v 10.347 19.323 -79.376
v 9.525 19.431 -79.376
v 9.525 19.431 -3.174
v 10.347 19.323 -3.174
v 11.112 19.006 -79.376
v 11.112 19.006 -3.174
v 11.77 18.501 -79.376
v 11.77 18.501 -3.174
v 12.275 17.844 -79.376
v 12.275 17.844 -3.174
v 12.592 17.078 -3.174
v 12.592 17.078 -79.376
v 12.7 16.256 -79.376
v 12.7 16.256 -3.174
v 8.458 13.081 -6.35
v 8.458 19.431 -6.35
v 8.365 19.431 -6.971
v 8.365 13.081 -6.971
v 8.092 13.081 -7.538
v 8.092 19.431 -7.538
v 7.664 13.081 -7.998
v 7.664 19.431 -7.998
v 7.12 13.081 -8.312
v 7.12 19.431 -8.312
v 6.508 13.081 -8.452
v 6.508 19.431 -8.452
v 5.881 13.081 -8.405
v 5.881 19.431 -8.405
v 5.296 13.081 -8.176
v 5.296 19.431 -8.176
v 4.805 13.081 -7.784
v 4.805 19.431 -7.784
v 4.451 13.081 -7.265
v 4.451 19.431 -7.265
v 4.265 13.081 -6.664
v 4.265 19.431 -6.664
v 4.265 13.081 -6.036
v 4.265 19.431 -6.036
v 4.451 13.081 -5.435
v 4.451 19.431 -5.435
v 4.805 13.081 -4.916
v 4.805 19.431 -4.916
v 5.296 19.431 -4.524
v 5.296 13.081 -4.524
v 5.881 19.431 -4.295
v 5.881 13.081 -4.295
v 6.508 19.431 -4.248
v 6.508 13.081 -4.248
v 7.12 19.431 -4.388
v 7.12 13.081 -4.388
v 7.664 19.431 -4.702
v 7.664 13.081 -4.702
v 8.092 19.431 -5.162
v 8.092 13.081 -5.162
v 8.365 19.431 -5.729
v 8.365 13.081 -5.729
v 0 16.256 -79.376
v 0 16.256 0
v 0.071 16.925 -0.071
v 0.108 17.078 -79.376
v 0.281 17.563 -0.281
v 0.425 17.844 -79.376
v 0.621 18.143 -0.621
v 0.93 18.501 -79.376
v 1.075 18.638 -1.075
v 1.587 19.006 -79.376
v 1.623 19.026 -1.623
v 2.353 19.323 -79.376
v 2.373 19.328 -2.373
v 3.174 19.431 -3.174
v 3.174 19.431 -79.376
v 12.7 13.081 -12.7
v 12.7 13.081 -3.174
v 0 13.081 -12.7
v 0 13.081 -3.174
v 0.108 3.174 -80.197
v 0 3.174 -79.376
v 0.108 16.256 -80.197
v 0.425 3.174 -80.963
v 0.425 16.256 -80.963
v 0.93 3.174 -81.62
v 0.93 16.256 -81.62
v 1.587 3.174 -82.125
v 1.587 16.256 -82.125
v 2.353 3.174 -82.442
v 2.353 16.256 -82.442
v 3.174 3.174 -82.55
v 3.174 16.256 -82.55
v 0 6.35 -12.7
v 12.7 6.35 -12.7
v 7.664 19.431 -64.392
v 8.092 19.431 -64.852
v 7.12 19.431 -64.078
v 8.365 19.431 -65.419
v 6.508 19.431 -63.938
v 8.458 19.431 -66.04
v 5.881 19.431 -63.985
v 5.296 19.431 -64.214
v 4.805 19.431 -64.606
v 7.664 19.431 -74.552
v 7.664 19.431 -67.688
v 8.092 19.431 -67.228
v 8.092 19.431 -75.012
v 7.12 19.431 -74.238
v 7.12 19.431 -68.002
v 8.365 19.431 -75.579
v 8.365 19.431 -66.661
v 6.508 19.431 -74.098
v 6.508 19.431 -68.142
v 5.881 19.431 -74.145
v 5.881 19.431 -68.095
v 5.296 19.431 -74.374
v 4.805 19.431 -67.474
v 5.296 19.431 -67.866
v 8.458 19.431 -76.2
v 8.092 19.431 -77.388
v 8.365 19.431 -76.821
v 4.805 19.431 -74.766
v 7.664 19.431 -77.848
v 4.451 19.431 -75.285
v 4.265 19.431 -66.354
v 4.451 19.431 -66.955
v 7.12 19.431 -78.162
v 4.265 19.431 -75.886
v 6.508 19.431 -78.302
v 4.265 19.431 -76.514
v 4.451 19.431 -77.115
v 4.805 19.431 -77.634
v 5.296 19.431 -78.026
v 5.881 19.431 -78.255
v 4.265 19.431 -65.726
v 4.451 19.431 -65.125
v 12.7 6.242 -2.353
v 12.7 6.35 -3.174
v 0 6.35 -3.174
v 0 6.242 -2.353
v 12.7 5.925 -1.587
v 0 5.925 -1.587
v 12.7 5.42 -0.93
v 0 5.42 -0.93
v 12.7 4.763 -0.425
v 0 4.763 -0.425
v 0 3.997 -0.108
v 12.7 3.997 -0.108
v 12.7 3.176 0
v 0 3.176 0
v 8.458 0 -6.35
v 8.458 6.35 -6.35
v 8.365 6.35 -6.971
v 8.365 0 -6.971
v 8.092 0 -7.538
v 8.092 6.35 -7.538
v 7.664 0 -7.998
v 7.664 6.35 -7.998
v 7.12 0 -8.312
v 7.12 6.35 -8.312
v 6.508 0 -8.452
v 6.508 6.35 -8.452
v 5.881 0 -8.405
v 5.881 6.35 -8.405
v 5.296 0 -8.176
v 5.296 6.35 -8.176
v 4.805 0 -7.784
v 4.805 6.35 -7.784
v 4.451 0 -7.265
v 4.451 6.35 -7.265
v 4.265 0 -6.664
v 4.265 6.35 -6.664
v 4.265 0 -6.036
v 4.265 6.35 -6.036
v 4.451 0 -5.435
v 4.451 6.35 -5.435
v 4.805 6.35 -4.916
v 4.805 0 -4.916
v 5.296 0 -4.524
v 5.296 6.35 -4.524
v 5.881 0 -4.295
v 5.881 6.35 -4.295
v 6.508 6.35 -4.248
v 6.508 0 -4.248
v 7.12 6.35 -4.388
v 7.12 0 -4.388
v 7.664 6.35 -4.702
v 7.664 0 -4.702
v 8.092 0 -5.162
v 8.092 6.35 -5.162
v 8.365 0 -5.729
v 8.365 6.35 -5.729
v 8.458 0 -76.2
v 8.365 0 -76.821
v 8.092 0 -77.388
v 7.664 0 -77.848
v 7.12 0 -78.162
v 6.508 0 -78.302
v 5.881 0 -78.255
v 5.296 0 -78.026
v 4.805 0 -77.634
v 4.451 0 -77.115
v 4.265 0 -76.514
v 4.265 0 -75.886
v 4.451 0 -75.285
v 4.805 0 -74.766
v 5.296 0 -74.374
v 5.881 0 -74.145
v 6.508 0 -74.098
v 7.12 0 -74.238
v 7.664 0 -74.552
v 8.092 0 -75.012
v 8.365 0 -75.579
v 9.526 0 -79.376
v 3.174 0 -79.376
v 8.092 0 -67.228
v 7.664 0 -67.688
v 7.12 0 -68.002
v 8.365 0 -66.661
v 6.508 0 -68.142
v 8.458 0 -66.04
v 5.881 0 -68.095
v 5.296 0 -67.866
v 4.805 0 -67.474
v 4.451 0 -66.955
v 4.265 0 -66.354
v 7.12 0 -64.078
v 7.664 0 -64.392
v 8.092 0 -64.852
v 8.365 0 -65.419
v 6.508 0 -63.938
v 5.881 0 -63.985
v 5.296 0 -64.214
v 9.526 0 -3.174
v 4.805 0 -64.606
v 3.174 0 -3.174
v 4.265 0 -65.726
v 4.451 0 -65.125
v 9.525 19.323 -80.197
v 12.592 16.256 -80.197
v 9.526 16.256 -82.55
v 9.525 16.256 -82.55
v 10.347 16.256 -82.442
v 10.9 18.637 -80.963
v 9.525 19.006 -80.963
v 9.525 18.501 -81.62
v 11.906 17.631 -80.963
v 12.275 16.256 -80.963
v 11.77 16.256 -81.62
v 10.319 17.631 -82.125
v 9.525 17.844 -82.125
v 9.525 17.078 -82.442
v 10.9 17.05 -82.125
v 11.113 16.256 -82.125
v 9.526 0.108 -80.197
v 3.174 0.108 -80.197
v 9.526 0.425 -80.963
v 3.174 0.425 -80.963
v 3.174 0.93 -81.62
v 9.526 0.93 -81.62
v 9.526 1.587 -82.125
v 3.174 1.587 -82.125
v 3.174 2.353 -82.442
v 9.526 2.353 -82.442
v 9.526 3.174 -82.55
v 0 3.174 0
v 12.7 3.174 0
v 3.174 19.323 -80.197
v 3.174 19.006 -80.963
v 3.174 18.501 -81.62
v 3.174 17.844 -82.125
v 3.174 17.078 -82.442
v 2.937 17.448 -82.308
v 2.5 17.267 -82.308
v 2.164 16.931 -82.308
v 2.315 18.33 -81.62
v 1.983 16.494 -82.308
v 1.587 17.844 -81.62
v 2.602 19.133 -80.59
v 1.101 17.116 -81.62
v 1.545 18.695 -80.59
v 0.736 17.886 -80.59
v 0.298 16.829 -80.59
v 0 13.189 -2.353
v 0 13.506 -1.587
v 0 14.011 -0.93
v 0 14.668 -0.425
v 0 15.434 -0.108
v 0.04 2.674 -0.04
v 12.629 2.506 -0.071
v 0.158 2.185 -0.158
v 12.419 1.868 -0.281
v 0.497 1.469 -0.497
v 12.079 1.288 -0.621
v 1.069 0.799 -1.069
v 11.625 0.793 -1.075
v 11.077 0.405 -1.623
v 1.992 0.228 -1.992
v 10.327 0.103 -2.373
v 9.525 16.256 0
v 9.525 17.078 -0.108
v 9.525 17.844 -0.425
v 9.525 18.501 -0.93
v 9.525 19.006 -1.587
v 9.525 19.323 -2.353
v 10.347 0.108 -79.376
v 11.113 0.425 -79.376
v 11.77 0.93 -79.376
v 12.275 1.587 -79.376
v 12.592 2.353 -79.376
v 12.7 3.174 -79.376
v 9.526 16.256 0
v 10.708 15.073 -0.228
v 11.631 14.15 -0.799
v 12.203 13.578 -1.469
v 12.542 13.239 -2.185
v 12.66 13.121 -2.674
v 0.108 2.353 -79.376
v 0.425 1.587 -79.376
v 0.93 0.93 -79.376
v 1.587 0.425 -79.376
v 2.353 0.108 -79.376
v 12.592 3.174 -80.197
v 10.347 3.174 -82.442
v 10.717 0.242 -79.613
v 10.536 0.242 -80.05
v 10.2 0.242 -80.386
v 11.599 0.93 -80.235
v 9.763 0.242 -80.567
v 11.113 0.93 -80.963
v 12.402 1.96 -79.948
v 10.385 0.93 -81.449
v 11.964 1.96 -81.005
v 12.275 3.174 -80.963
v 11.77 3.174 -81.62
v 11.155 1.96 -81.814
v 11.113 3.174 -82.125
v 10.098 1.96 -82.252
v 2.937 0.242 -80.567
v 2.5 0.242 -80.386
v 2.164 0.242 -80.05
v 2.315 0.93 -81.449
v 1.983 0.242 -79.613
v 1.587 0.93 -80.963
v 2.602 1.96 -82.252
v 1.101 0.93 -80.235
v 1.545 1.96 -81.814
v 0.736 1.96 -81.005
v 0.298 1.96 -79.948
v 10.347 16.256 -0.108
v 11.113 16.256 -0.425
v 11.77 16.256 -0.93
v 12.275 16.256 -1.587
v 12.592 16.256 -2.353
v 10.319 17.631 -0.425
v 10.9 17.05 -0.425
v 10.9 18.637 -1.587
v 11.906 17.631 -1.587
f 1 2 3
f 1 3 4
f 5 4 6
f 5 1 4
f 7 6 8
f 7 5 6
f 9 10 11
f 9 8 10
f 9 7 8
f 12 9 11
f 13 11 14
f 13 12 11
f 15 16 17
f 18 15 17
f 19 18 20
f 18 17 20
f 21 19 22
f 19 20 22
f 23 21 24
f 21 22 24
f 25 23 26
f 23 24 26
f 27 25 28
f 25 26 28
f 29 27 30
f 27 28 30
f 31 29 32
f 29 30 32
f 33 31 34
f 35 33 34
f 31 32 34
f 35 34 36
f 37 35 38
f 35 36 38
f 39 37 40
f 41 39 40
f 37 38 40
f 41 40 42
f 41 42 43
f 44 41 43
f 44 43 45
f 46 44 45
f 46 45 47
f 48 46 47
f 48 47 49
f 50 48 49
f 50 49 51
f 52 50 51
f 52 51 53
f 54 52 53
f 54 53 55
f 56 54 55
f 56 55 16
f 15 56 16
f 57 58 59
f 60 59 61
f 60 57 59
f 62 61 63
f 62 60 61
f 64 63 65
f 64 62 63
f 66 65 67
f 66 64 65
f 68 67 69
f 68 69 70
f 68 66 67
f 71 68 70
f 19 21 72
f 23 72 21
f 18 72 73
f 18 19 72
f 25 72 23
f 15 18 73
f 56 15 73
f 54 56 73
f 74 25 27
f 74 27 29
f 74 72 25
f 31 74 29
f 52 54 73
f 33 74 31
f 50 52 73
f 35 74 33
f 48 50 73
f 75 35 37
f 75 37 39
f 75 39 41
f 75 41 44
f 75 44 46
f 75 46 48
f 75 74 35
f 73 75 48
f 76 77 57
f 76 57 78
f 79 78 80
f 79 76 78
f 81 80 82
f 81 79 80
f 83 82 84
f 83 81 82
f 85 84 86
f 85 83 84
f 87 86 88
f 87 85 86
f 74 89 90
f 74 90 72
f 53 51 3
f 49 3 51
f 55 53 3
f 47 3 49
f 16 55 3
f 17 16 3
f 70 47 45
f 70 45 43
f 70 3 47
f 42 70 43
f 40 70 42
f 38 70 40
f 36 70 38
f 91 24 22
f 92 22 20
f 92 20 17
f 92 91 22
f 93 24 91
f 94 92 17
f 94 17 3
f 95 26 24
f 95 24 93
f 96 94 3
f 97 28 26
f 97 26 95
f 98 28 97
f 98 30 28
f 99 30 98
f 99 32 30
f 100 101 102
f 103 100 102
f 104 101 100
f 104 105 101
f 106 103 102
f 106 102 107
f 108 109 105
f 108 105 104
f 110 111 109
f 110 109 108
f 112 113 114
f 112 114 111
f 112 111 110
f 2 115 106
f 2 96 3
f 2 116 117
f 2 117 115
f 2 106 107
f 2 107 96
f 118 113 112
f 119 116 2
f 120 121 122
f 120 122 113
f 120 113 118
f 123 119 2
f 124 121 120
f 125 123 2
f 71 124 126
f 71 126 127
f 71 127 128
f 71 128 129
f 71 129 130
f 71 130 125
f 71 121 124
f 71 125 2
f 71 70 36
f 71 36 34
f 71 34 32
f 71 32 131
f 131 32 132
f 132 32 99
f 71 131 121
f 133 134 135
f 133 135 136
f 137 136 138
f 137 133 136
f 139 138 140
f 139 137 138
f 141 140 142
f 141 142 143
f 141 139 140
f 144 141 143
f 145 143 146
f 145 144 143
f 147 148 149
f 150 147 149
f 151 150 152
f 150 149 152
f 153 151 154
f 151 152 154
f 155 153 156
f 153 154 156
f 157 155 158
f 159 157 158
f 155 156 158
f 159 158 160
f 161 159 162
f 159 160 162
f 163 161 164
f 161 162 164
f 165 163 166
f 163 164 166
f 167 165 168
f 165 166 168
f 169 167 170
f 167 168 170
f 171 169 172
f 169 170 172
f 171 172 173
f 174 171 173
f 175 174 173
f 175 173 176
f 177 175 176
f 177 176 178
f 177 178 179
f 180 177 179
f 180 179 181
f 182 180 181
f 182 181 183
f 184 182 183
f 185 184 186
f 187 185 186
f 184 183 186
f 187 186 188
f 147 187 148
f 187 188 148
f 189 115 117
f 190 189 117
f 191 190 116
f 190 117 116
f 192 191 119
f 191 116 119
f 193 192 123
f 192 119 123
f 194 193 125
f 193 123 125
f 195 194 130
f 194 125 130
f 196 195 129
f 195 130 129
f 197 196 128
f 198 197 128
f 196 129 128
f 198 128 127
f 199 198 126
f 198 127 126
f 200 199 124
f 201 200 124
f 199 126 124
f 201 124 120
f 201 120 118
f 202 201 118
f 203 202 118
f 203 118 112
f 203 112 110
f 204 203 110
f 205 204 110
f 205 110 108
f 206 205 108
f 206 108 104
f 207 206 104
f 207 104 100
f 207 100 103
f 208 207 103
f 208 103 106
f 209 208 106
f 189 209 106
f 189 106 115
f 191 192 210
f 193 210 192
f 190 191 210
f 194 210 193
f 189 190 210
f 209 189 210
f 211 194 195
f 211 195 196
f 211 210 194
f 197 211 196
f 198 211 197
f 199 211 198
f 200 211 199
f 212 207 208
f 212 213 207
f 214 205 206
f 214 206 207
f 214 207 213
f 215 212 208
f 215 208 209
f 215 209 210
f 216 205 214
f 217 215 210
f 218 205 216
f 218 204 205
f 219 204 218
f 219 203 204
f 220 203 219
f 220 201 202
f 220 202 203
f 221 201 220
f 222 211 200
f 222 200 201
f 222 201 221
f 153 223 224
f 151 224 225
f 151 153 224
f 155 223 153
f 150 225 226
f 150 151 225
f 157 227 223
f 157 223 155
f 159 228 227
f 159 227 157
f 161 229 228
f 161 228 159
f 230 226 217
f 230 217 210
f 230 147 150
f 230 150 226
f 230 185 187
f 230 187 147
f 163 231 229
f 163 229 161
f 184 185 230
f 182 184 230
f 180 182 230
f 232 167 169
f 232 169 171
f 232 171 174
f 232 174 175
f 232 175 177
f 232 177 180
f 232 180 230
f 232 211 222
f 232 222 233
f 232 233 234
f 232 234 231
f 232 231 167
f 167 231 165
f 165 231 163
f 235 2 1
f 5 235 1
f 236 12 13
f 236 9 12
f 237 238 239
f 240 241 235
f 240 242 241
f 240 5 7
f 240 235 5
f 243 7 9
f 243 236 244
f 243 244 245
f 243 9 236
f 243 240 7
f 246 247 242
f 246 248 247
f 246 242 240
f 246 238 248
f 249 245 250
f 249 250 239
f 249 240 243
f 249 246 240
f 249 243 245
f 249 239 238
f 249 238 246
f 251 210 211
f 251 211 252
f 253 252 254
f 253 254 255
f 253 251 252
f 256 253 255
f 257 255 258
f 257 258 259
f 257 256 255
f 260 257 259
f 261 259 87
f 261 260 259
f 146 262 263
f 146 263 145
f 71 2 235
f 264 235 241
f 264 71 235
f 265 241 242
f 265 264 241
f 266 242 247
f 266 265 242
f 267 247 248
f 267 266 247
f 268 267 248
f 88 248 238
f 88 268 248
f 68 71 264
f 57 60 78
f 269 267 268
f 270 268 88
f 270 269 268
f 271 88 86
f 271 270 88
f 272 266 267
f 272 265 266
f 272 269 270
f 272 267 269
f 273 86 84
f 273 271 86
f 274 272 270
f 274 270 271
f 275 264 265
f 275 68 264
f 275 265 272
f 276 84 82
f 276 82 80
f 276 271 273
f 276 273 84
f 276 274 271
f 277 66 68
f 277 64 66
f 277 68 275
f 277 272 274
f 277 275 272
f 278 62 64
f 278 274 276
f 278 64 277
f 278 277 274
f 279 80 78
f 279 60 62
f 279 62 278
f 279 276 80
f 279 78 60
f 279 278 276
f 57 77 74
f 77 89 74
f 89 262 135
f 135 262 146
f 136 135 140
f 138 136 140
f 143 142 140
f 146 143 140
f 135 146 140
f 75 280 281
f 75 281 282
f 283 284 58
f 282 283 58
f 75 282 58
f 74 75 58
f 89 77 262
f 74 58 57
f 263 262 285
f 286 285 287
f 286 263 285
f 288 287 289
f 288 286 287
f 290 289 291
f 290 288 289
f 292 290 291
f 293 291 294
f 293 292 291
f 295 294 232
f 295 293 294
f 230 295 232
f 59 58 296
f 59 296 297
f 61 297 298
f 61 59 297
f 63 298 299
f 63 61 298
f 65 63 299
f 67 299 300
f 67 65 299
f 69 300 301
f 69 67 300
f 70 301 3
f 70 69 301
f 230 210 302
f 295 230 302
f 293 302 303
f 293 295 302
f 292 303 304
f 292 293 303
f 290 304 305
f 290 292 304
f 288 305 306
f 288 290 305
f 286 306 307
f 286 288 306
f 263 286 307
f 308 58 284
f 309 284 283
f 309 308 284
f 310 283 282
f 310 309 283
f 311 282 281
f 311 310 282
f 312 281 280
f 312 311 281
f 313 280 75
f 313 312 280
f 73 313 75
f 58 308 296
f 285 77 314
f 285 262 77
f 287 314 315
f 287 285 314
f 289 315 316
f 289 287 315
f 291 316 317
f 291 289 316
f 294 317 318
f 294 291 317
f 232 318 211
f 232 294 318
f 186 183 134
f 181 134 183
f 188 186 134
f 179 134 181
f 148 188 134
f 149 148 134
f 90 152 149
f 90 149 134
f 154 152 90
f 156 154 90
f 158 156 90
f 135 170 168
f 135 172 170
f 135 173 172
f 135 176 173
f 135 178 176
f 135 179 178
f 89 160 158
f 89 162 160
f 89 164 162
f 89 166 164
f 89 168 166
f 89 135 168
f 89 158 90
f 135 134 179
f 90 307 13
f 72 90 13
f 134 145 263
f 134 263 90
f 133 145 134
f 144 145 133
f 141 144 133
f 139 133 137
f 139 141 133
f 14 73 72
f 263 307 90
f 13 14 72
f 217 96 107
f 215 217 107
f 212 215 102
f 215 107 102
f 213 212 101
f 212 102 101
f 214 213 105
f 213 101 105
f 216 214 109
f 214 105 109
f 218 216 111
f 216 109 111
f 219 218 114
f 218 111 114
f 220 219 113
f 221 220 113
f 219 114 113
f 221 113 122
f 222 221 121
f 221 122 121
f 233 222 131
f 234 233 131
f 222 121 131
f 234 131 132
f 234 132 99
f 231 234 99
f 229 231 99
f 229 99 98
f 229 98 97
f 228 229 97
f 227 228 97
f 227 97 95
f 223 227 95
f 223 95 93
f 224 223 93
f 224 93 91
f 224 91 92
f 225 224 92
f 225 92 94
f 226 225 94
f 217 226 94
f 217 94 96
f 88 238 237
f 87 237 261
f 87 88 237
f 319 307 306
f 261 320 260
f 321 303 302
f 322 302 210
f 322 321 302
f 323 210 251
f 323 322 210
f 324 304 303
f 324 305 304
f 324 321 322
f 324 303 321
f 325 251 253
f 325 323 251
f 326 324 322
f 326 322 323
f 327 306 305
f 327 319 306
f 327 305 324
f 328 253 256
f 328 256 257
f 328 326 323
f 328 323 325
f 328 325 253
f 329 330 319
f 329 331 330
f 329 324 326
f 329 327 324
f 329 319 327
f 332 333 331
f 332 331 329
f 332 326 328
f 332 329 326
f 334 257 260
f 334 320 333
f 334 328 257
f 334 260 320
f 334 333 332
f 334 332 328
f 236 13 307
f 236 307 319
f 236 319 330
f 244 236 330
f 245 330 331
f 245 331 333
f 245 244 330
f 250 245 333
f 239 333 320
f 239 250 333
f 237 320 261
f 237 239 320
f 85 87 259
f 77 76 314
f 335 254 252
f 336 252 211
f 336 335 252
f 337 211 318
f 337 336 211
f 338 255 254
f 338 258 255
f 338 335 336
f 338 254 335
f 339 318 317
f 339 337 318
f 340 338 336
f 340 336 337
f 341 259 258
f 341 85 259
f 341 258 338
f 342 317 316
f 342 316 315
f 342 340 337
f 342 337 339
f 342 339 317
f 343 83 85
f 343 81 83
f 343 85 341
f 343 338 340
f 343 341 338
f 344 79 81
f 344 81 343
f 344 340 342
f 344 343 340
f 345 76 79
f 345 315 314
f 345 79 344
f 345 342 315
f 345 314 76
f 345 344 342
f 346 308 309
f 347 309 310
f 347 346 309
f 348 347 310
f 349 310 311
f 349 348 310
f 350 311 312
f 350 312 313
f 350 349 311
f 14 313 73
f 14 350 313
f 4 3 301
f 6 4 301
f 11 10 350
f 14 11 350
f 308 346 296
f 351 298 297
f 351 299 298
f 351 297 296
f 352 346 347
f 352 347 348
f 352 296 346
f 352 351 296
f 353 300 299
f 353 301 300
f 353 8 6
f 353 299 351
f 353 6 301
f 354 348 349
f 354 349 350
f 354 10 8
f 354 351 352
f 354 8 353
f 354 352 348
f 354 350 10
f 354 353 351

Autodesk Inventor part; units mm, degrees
ref_plane "YZ Plane" through (0, 0, 0) normal (1, 0, 0) x (0, 1, 0)
ref_plane "XZ Plane" through (0, 0, 0) normal (0, 1, 0) x (-1, 0, 0)
ref_plane "XY Plane" through (0, 0, 0) normal (0, 0, 1) x (1, 0, 0)
sketch "Sketch1" plane through (0, 0, 0) normal (1, 0, 0) x (0, 1, 0)
  line L0 (0, 0) -> (6.35, 0)
  line L1 (6.35, 0) -> (6.35, -12.7)
  line L2 (6.35, -12.7) -> (13.081, -12.7)
  line L3 (13.081, -12.7) -> (13.081, 0)
  line L4 (13.081, 0) -> (19.431, 0)
  line L5 (19.431, 0) -> (19.431, -82.55)
  line L6 (19.431, -82.55) -> (0, -82.55)
  line L7 (0, -82.55) -> (0, 0)
  dimension "d0" = 6.35
  dimension "d1" = 12.7
  dimension "d2" = 6.731
  dimension "d11" = 6.35
  dimension "d12" = 82.55
  dimension "d18" = 12.7
extrude "Extrusion1" add sketch "Sketch1" along normal blind 12.7
sketch "Sketch3" plane through (0, 19.431, 0) normal (0, 1, 0) x (1, 0, 0)
  line L0 (0, 12.7) -> (12.7, 12.7) projected
  line L1 (12.7, 12.7) -> (0, 12.7)
  line L2 (0, 12.7) -> (0, 0)
  line L3 (0, 0) -> (12.7, 0)
  line L4 (12.7, 0) -> (12.7, 12.7)
  line L5 (0, 0) -> (12.7, 12.7)
  circle A0 centre (6.35, 6.35) radius 2.1082
  line L6 (0, 82.55) -> (12.7, 82.55) projected
  line L7 (6.35, 82.55) -> (6.35, 76.2)
  circle A1 centre (6.35, 76.2) radius 2.1082
  dimension "d13" = 4.2164
  dimension "d16" = 6.35
  dimension "d17" = 4.2164
extrude "Extrusion3" cut sketch "Sketch3" against normal blind 28.575 contours A0 L5 | L5 A0 | A1
fillet "Fillet1" radius 3.175 1 edges at (12.7, 19.431, -41.275)
fillet "Fillet2" radius 3.175 14 edges at (11.7701, 18.5011, 0) (12.7, 14.6685, 0) (4.7625, 19.431, 0) (0, 19.431, -41.275) (11.7701, 18.5011, -82.55) (12.7, 8.128, -82.55) (4.7625, 19.431, -82.55) (0, 9.7155, -82.55) (12.7, 0, -41.275) (6.35, 0, -82.55) (0, 0, -41.275) (6.35, 0, 0) (6.35, 6.35, 0) (6.35, 13.081, 0)
sketch "Sketch5" plane through (3.175, 19.431, -3.175) normal (0, 1, 0) x (1, 0, 0)
  circle A0 centre (3.175, 73.025) radius 2.1082 projected
  line L0 (3.175, 73.025) -> (3.175, 62.865)
  circle A1 centre (3.175, 62.865) radius 2.1082
  point P0 (-3.175, -3.175)
  dimension "d26" = 10.16
extrude "Extrusion5" cut sketch "Sketch5" against normal blind 25.4 contours A1
properties part number "wing bar"
